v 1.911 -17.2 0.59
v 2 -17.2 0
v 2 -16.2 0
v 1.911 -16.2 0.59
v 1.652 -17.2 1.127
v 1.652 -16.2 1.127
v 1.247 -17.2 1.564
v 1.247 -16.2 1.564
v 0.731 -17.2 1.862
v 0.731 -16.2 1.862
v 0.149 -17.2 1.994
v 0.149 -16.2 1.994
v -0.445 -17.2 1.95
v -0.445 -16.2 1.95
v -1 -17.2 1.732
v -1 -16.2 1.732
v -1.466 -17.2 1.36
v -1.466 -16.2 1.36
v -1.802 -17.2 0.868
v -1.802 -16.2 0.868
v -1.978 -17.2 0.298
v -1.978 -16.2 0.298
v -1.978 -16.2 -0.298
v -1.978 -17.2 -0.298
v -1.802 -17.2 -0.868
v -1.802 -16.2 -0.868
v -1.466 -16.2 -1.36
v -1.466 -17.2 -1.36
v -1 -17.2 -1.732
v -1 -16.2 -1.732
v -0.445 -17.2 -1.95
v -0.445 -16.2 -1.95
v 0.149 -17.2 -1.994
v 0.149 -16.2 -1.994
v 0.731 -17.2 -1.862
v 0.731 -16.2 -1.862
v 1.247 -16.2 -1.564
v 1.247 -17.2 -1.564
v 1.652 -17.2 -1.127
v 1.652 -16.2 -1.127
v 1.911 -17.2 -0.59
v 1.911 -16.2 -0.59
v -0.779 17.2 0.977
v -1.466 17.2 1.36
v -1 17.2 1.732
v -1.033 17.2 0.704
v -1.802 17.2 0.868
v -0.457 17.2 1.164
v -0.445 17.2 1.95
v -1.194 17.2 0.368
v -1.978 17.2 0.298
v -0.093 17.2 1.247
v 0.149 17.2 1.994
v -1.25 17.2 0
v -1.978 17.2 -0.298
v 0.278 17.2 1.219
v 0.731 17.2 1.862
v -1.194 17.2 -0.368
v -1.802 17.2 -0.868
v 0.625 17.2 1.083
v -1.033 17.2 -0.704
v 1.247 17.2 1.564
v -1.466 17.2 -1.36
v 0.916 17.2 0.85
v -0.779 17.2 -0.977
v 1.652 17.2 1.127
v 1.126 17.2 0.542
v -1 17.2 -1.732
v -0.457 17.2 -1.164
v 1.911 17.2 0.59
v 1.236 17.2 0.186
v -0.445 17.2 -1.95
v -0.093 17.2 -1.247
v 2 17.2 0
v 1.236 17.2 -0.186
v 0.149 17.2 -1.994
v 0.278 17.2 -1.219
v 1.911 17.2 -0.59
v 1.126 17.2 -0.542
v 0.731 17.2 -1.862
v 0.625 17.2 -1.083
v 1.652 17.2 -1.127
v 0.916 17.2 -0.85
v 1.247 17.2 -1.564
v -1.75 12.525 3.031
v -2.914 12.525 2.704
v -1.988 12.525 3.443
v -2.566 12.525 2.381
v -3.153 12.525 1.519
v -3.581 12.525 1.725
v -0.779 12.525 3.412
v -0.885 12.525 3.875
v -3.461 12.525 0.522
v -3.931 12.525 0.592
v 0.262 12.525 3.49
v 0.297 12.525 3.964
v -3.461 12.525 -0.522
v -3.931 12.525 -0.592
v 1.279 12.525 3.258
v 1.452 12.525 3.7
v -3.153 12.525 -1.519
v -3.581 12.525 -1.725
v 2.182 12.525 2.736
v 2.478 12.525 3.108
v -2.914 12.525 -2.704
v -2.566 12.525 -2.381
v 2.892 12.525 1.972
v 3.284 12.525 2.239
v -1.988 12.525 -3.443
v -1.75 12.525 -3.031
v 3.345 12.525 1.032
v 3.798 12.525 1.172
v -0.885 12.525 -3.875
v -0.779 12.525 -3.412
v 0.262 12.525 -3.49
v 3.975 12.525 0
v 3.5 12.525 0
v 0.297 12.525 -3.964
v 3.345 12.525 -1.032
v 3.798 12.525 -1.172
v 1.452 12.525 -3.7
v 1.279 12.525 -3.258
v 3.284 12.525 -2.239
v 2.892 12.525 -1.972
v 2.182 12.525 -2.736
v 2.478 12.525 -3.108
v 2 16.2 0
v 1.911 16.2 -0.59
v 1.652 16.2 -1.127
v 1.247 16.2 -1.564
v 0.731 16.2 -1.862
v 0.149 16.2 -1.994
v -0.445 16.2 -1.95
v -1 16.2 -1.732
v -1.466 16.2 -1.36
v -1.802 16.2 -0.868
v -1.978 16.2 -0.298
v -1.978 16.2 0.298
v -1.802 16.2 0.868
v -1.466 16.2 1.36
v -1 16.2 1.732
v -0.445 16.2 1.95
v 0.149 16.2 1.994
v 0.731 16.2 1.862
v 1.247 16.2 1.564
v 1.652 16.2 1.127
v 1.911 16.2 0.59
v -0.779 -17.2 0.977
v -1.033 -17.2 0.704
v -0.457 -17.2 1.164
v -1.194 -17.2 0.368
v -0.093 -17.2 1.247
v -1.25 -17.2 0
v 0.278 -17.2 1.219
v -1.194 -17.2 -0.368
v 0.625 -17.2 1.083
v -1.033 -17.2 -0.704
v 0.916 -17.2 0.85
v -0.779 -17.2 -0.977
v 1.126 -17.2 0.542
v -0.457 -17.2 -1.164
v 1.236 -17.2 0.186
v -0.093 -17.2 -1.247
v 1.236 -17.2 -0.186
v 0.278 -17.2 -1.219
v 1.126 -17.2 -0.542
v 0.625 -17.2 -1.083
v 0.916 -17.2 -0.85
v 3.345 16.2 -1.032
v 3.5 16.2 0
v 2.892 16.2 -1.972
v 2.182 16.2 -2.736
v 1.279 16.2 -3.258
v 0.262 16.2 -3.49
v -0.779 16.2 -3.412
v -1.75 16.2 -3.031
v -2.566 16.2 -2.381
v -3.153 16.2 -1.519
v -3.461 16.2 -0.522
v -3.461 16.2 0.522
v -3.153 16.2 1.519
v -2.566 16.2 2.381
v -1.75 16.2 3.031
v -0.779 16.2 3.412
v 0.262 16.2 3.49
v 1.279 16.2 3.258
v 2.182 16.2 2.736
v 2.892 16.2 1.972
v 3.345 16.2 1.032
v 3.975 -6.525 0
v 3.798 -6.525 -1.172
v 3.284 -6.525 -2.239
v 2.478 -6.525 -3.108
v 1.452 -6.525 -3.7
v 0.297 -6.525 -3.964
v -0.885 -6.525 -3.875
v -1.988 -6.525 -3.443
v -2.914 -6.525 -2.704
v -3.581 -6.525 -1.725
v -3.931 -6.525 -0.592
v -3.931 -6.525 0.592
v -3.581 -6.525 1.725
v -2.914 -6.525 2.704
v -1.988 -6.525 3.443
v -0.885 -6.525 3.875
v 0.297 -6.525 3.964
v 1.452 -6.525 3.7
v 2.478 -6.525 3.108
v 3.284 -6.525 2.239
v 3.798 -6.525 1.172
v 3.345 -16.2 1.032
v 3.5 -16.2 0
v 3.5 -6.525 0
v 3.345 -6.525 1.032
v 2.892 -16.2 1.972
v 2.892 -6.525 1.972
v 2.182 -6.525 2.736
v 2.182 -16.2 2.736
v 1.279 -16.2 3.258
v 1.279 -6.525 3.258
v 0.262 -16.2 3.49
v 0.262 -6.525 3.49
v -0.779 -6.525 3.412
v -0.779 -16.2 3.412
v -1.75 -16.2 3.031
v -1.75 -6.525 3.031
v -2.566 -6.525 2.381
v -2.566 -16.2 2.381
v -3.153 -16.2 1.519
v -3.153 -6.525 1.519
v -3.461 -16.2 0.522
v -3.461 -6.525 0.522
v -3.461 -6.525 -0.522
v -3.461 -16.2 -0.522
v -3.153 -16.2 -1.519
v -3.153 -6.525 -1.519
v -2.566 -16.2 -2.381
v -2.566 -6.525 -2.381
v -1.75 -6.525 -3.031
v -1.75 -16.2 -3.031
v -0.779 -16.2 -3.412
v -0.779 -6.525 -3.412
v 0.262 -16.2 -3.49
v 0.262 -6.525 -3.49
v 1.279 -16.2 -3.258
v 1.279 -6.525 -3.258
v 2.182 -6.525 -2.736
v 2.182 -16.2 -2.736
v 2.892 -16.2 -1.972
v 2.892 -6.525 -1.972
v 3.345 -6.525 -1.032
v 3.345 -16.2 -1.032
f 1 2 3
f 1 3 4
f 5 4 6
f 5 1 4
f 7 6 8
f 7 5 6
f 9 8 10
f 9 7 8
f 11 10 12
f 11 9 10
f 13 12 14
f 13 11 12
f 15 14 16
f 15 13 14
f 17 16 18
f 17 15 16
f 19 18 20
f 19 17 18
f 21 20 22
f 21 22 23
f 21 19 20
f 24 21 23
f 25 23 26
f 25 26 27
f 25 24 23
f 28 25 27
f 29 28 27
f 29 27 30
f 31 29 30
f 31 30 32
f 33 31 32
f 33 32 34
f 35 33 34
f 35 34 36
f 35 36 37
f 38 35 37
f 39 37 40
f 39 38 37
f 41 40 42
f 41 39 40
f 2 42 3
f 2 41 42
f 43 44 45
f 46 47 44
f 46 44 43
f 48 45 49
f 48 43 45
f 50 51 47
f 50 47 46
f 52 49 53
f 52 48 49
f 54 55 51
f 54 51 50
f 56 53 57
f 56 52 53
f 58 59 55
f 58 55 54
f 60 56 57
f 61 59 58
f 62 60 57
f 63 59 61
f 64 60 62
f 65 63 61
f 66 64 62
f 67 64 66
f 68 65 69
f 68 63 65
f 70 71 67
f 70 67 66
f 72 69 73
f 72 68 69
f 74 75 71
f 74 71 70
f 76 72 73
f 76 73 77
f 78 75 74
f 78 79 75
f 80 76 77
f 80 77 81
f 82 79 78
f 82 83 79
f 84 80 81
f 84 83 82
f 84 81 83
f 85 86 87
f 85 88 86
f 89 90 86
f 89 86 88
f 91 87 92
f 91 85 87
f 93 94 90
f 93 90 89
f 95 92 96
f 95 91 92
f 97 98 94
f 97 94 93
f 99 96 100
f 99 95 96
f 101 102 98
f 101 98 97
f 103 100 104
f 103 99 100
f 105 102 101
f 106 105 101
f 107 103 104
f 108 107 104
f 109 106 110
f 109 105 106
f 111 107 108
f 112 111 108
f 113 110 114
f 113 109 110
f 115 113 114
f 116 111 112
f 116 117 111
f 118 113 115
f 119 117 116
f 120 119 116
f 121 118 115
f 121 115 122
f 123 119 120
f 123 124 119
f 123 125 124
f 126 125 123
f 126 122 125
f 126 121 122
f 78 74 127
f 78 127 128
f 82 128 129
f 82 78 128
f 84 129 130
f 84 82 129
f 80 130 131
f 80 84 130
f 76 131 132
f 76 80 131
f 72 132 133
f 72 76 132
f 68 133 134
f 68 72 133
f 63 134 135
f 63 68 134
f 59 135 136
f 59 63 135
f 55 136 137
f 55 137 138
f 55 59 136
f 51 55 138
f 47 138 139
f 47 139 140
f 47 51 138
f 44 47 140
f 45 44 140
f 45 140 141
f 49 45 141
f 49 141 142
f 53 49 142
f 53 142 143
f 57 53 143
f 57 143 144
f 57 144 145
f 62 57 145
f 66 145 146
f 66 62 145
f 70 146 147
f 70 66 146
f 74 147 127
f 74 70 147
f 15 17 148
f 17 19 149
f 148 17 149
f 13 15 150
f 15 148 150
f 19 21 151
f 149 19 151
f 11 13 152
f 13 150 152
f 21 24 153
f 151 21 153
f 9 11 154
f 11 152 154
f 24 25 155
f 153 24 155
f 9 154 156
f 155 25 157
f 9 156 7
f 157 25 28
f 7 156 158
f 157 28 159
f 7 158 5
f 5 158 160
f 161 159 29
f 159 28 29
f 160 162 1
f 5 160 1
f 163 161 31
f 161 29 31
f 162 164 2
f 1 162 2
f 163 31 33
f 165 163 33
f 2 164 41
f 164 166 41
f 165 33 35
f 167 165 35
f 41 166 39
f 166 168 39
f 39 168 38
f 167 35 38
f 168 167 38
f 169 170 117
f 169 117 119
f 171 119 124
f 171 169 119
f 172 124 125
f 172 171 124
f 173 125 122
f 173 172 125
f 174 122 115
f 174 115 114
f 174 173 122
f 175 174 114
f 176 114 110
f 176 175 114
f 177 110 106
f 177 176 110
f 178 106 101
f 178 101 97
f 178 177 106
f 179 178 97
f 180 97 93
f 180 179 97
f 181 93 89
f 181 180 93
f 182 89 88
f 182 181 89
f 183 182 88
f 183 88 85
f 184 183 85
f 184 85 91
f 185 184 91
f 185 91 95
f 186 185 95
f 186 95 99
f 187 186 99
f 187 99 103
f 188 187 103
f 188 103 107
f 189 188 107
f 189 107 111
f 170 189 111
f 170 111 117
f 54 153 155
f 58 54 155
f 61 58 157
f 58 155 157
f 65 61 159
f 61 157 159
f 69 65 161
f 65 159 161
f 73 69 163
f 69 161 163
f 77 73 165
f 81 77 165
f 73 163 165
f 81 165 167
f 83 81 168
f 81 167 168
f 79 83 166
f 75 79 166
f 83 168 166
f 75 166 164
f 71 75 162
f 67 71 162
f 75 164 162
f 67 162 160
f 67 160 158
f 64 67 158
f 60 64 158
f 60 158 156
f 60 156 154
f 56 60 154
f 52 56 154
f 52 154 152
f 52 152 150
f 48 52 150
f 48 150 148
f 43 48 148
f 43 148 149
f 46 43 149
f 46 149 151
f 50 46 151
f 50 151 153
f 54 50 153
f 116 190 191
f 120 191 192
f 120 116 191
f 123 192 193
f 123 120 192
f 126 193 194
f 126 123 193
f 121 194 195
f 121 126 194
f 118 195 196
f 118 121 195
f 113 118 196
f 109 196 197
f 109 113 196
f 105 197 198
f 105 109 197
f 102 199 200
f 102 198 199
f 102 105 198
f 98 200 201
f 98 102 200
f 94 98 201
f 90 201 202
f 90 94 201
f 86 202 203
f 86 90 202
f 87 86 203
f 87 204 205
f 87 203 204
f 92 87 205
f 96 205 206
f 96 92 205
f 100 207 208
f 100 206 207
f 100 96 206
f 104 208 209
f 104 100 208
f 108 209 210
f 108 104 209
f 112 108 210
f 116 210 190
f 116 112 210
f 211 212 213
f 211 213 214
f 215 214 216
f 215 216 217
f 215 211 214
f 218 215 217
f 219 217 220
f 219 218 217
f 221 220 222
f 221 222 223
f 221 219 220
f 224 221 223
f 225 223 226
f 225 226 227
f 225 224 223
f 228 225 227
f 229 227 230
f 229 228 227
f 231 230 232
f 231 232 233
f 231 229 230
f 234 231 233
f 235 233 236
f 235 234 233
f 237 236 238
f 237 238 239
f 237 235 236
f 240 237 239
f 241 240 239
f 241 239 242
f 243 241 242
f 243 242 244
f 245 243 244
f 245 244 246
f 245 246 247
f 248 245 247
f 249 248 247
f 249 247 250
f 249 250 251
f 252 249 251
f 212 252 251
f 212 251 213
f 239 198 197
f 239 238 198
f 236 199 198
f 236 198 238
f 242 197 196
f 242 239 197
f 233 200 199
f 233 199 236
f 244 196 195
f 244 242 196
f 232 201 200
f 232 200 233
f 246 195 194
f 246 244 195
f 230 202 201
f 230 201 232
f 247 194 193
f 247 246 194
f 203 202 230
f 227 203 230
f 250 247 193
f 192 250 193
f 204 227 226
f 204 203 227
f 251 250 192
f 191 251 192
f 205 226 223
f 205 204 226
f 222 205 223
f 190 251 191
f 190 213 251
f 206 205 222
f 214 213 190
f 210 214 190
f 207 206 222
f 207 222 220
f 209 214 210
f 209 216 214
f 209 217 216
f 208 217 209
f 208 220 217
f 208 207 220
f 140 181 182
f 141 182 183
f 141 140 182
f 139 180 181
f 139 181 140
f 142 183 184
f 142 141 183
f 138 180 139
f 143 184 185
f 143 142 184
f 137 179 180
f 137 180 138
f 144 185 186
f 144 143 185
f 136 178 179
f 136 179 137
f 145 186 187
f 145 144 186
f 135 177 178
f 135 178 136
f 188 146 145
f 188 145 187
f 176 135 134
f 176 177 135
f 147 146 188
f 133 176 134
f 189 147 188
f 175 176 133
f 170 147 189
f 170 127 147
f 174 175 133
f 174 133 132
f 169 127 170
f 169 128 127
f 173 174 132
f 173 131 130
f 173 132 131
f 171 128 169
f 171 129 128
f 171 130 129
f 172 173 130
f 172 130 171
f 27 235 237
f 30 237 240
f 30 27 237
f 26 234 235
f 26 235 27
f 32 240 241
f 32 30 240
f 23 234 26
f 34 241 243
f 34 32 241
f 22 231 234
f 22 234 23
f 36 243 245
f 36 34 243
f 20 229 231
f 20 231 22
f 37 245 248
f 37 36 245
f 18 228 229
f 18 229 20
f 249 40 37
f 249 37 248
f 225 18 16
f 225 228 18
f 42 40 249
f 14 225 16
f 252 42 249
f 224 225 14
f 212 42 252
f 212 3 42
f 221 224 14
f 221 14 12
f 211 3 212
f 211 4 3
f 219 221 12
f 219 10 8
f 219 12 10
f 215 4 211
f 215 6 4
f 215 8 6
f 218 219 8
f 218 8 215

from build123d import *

# Parameters (mm, degrees)
SKETCH2_R             = 3.9751
BOSS_EXTRUDE1_DEPTH   = 17.2
M3X0_5_TAPPED_HOLE1_D = 2.5
SKETCH5_R             = 3.9751
SKETCH5_R_2           = 3.5
CUT_EXTRUDE1_DEPTH    = 4.675
SKETCH6_R             = 3.5
SKETCH6_R_2           = 2
CUT_EXTRUDE2_DEPTH    = 1
SKETCH7_R             = 3.9751
SKETCH7_R_2           = 3.5
CUT_EXTRUDE3_DEPTH    = 10.675
SKETCH8_R             = 3.5
SKETCH8_R_2           = 2
CUT_EXTRUDE4_DEPTH    = 1


with BuildPart() as part:
    # Sketch2 → Boss-Extrude1 (new body, symmetric)
    with BuildSketch(Plane(origin=(0, 0, 0), x_dir=(1, 0, 0), z_dir=(0, 1, 0))):
        Circle(SKETCH2_R)
    extrude(amount=BOSS_EXTRUDE1_DEPTH, both=True)

    # M3x0.5 Tapped Hole1 (through all)
    with Locations(Plane(origin=(0, 17.2, 0), x_dir=(1, 0, 0), z_dir=(0, 1, 0))):
        with Locations((0, 0)):
            Hole(M3X0_5_TAPPED_HOLE1_D / 2)

    # Sketch5 → Cut-Extrude1 (cut)
    with BuildSketch(Plane(origin=(0, 17.2, 0), x_dir=(1, 0, 0), z_dir=(0, 1, 0))):
        Circle(SKETCH5_R)
        Circle(SKETCH5_R_2, mode=Mode.SUBTRACT)
    extrude(amount=-CUT_EXTRUDE1_DEPTH, mode=Mode.SUBTRACT)

    # Sketch6 → Cut-Extrude2 (cut)
    with BuildSketch(Plane(origin=(0, 17.2, 0), x_dir=(1, 0, 0), z_dir=(0, 1, 0))):
        Circle(SKETCH6_R)
        Circle(SKETCH6_R_2, mode=Mode.SUBTRACT)
    extrude(amount=-CUT_EXTRUDE2_DEPTH, mode=Mode.SUBTRACT)

    # Sketch7 → Cut-Extrude3 (cut)
    with BuildSketch(Plane.XZ.offset(17.2)):
        Circle(SKETCH7_R)
        Circle(SKETCH7_R_2, mode=Mode.SUBTRACT)
    extrude(amount=-CUT_EXTRUDE3_DEPTH, mode=Mode.SUBTRACT)

    # Sketch8 → Cut-Extrude4 (cut)
    with BuildSketch(Plane.XZ.offset(17.2)):
        Circle(SKETCH8_R)
        Circle(SKETCH8_R_2, mode=Mode.SUBTRACT)
    extrude(amount=-CUT_EXTRUDE4_DEPTH, mode=Mode.SUBTRACT)


solid = part.part
